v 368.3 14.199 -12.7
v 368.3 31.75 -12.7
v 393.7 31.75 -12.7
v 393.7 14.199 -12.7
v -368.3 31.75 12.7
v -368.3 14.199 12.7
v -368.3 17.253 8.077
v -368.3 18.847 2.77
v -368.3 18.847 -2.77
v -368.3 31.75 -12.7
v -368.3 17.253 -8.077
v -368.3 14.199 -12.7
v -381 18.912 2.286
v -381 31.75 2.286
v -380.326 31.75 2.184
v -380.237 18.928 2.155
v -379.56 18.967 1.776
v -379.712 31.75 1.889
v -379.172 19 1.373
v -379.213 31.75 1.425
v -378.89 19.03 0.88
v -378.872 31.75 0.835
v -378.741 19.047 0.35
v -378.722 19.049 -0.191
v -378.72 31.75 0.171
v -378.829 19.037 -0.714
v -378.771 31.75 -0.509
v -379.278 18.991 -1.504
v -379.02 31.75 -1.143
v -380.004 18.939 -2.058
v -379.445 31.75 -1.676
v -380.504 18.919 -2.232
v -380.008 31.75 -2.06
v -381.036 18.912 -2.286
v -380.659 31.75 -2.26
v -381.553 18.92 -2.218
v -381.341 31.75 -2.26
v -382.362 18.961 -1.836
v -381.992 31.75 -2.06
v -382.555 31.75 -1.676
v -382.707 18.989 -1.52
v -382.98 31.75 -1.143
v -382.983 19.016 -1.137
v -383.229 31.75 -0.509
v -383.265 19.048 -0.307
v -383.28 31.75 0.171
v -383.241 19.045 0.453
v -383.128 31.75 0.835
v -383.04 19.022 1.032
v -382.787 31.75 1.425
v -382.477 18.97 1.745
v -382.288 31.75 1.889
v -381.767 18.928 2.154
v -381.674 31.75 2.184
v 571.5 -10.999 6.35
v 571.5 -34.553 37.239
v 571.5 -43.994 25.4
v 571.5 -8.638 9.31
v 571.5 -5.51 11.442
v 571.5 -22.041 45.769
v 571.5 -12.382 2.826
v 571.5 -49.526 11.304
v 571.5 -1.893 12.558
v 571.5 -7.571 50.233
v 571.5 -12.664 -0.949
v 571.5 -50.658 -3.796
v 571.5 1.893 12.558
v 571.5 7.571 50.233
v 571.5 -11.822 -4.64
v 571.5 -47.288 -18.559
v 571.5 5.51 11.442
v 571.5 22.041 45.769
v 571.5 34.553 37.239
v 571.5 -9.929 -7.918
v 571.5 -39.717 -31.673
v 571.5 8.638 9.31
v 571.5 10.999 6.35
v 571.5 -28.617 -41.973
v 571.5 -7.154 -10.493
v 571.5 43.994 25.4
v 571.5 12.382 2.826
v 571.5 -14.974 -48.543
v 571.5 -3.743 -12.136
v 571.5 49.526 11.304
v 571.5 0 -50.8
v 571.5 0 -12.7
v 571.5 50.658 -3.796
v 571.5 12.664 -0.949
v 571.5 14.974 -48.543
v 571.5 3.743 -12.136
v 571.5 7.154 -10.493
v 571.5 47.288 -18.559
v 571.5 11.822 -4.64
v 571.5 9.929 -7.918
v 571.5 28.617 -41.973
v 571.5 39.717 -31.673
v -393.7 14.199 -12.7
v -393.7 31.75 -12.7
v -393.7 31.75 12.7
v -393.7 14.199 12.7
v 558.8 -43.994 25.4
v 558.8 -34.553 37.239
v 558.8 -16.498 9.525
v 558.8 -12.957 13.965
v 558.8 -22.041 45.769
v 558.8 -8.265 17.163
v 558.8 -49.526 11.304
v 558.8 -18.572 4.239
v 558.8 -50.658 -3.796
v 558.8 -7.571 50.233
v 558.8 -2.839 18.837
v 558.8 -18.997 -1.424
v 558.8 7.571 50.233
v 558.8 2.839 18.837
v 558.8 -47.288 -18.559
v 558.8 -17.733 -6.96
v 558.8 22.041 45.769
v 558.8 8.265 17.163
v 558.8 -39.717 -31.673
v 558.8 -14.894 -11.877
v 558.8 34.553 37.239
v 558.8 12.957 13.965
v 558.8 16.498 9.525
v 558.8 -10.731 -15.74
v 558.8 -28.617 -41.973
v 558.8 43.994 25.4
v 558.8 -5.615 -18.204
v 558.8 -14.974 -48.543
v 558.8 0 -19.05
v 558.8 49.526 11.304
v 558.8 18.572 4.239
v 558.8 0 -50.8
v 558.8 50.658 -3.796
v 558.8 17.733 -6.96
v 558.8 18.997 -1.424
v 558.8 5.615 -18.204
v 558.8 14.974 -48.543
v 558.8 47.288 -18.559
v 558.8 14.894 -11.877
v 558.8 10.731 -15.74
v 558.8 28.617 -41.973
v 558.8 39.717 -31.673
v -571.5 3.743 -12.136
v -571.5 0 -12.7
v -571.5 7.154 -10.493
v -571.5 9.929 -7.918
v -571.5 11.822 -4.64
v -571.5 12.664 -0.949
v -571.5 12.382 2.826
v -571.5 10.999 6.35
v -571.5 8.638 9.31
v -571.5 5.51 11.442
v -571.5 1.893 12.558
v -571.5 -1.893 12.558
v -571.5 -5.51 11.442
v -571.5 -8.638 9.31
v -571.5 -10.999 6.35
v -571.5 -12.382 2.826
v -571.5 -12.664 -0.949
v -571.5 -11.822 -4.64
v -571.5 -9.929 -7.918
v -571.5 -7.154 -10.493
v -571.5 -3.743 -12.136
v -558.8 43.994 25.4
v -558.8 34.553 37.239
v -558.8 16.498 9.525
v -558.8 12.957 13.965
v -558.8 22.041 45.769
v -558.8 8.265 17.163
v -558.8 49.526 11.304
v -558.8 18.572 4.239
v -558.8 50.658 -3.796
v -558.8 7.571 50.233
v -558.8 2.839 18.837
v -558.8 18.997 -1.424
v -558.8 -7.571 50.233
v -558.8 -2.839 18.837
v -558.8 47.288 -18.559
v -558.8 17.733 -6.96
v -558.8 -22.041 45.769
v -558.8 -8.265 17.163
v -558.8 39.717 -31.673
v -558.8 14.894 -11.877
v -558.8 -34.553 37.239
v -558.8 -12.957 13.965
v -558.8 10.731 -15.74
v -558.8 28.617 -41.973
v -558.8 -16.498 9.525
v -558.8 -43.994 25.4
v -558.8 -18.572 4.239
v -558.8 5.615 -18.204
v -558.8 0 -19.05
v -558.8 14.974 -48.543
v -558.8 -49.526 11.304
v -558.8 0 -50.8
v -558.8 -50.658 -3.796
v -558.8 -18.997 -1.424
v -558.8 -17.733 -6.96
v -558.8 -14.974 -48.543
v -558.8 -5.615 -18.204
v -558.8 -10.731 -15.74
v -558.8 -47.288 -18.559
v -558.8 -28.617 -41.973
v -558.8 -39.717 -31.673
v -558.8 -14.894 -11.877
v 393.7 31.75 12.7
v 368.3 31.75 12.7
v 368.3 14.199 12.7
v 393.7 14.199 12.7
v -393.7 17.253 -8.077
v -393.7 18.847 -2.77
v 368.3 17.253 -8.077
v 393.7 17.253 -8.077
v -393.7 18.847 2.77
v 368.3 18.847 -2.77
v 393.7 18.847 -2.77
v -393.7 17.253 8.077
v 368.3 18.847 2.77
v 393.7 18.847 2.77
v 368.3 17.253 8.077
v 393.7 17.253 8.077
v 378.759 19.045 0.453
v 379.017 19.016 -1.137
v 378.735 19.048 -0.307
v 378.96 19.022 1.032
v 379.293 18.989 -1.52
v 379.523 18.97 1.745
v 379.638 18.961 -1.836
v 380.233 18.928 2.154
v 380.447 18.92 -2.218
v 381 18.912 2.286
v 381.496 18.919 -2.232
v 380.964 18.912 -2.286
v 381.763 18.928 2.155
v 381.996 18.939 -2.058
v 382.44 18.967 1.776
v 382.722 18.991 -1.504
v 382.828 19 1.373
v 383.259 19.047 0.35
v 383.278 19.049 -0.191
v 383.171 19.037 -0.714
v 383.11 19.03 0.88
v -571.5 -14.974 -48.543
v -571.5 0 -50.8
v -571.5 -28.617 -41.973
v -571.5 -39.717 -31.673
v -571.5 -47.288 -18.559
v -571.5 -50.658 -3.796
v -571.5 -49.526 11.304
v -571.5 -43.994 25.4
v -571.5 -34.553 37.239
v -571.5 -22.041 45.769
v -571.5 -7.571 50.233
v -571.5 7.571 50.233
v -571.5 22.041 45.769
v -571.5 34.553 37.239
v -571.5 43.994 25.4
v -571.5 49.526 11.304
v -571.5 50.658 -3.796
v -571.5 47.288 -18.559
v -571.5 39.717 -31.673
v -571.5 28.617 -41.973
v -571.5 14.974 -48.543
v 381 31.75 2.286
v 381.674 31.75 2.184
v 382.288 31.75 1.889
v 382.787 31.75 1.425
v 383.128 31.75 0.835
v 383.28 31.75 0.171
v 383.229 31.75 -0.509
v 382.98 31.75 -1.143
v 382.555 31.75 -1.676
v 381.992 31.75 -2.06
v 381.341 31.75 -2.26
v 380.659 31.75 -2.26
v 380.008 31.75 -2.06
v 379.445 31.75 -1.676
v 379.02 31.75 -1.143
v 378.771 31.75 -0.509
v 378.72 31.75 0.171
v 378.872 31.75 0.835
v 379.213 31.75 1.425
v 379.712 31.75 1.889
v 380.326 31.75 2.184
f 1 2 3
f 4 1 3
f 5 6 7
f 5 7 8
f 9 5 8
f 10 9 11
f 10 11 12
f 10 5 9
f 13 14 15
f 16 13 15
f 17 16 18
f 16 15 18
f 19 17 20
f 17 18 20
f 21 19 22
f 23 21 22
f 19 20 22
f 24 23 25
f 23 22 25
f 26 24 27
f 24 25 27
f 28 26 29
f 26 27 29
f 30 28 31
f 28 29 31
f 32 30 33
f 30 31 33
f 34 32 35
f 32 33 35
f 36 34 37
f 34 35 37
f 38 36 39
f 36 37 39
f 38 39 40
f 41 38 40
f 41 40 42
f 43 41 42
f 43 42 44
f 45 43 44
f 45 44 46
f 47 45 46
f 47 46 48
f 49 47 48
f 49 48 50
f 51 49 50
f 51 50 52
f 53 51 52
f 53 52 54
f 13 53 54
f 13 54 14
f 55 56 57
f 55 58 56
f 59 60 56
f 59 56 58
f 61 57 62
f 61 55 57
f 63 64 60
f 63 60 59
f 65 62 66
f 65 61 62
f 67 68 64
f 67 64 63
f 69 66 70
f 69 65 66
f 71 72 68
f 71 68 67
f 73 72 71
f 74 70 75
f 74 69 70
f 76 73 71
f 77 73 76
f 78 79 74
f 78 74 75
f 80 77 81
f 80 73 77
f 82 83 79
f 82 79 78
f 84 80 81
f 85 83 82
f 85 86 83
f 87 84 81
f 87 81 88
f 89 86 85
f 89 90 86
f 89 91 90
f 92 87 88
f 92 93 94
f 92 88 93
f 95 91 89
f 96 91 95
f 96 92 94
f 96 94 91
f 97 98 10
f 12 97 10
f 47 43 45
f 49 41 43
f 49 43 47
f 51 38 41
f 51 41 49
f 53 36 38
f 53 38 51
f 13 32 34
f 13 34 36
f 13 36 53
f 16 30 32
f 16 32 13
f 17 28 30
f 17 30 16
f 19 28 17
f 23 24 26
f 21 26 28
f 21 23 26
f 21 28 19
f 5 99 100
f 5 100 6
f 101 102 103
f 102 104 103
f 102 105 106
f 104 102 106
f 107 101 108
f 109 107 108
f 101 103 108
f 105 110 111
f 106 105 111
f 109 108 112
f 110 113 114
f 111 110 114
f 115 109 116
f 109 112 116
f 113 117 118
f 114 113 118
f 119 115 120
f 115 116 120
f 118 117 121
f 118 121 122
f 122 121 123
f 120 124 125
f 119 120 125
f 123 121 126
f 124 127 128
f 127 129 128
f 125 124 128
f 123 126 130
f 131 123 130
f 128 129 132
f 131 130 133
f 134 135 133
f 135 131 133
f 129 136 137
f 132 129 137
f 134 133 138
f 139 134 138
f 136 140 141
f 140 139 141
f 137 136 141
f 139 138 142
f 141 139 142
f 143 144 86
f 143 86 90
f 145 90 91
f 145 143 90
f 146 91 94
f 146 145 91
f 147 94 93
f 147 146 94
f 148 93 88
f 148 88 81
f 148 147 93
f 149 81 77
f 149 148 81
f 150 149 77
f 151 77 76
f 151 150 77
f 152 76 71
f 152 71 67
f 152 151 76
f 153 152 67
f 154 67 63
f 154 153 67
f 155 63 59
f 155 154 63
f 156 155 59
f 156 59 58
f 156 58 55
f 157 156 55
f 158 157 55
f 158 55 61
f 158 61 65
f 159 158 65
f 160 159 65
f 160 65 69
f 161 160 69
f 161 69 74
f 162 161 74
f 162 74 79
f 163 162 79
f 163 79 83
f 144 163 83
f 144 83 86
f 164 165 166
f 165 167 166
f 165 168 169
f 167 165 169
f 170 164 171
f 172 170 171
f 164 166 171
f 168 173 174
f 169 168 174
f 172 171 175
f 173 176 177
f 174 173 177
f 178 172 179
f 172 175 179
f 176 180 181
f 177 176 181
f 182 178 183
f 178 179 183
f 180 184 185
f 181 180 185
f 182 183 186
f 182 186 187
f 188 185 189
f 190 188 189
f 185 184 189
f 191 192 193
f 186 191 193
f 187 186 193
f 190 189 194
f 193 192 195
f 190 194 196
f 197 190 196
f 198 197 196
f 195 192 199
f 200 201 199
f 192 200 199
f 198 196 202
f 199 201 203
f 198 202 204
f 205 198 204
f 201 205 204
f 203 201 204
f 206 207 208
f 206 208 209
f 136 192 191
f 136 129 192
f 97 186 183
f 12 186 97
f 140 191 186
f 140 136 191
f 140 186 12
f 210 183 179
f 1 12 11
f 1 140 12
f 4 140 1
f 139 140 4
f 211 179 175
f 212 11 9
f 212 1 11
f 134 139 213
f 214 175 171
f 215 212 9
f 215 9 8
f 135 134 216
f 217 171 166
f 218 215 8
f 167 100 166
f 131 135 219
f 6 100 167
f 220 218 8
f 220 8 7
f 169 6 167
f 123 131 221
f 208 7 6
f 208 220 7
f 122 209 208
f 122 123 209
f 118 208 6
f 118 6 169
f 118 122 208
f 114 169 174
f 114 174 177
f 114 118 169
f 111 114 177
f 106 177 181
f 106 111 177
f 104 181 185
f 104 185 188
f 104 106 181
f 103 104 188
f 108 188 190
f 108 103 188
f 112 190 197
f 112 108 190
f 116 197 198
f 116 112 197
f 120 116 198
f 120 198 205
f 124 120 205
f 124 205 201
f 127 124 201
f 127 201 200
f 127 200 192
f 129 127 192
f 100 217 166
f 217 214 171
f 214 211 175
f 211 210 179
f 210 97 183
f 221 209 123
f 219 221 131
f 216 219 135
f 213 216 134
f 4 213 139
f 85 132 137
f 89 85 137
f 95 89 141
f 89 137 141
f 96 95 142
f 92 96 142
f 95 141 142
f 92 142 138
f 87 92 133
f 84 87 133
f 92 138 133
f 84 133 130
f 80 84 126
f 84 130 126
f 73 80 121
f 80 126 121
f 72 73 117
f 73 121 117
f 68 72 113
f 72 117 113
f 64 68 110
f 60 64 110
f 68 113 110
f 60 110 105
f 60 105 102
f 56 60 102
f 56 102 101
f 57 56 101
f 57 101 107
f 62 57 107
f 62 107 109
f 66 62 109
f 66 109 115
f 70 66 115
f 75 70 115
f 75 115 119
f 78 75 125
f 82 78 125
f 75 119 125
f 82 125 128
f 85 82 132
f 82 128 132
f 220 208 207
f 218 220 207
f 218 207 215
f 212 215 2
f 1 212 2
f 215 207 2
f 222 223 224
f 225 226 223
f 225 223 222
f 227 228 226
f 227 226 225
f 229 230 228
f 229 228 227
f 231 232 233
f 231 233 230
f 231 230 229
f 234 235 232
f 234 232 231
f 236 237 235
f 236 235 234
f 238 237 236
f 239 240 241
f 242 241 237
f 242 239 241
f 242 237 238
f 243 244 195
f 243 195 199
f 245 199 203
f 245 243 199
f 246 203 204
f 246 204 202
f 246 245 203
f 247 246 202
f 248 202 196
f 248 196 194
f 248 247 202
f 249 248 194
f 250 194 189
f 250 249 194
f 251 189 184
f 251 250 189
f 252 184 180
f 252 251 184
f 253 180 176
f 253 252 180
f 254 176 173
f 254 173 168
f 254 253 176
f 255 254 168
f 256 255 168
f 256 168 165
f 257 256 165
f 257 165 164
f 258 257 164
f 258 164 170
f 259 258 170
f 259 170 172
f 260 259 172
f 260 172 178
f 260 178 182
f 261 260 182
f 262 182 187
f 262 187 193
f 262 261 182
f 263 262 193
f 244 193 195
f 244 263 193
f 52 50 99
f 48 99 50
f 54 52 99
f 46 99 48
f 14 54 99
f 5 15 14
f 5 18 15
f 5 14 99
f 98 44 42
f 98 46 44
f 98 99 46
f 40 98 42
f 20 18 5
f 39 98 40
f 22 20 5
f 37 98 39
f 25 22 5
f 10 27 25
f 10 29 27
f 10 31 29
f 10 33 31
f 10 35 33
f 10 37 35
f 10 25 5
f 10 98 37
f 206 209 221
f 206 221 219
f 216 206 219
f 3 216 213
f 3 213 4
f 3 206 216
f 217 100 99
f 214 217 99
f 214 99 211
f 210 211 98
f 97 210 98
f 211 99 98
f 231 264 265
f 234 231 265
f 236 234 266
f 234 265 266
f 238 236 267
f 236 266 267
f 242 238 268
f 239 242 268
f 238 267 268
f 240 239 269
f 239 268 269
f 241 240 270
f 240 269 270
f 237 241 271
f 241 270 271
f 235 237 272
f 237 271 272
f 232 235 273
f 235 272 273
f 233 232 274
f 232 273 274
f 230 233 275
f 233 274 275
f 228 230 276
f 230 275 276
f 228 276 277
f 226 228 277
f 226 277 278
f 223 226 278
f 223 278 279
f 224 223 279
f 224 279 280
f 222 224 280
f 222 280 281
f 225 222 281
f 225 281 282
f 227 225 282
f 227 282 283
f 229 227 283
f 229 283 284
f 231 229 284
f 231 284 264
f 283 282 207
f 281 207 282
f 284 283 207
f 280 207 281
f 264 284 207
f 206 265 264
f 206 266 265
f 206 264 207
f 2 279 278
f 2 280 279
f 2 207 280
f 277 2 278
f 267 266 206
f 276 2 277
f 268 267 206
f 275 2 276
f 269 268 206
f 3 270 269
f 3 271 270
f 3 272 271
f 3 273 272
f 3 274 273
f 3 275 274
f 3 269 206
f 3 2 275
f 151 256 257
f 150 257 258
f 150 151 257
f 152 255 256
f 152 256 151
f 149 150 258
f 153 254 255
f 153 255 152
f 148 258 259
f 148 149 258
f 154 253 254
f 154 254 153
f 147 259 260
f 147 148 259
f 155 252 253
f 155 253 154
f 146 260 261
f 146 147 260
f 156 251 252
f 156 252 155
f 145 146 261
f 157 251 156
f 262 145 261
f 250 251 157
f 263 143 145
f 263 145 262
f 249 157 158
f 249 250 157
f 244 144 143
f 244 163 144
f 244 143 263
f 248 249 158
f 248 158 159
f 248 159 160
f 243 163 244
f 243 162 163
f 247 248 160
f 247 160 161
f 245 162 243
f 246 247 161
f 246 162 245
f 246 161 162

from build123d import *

# Parameters (mm, degrees)
SKETCH1_R                = 19.05
SKETCH1_R_2              = 12.7
BOSS_EXTRUDE1_DEPTH      = 571.5
BOSS_EXTRUDE2_START      = -12.7
SKETCH2_R                = 50.8
SKETCH2_R_2              = 12.7
BOSS_EXTRUDE2_DEPTH      = 12.7
SKETCH3_R                = 50.8
SKETCH3_R_2              = 12.7
BOSS_EXTRUDE3_DEPTH      = 12.7
BOSS_EXTRUDE4_REACH      = 609.748
BOSS_EXTRUDE4_END_RADIUS = 19.05
BOSS_EXTRUDE4_START      = 31.75
SKETCH4_W                = 25.4
SKETCH4_H                = 25.4
SKETCH4_R                = 2.286


with BuildPart() as part:
    # Sketch1 → Boss-Extrude1 (new, symmetric)
    with BuildSketch(Plane(origin=(0, 0, 0), x_dir=(0, 0, -1), z_dir=(1, 0, 0))):
        Circle(SKETCH1_R)
        Circle(SKETCH1_R_2, mode=Mode.SUBTRACT)
    extrude(amount=BOSS_EXTRUDE1_DEPTH, both=True)

    # Sketch2 → Boss-Extrude2 (add)
    with BuildSketch(Plane(origin=(571.5, 0, 0), x_dir=(0, 0, -1), z_dir=(1, 0, 0)).offset(BOSS_EXTRUDE2_START)):
        Circle(SKETCH2_R)
        Circle(SKETCH2_R_2, mode=Mode.SUBTRACT)
    extrude(amount=BOSS_EXTRUDE2_DEPTH)

    # Sketch3 → Boss-Extrude3 (add)
    with BuildSketch(Plane.ZY.offset(571.5)):
        with Locations(Location((0, 0, 0), (0, 0, 180))):
            Circle(SKETCH3_R)
        with Locations(Location((0, 0, 0), (0, 0, 180))):
            Circle(SKETCH3_R_2, mode=Mode.SUBTRACT)
    extrude(amount=-BOSS_EXTRUDE3_DEPTH)

    # Boss-Extrude4: up to this cylinder (the profile starts outside it)
    boss_extrude4_end = Plane(origin=(-6.170395, 0, 0), z_dir=(-1, 0, 0)) * Cylinder(BOSS_EXTRUDE4_END_RADIUS, 2008.25521, mode=Mode.PRIVATE)
    # Sketch4 → Boss-Extrude4 (add, up to the surface)
    with BuildSketch(Plane(origin=(0, 0, 0), x_dir=(1, 0, 0), z_dir=(0, 1, 0)).offset(BOSS_EXTRUDE4_START), mode=Mode.PRIVATE) as boss_extrude4_sk1:
        with Locations((-381, 0)):
            Rectangle(SKETCH4_W, SKETCH4_H)
        with Locations(Location((-381, 0, 0), (0, 0, 270))):
            Circle(SKETCH4_R, mode=Mode.SUBTRACT)
    boss_extrude4_tool1 = extrude(boss_extrude4_sk1.sketch, amount=-BOSS_EXTRUDE4_REACH, mode=Mode.PRIVATE) - boss_extrude4_end
    add(boss_extrude4_tool1.solids().sort_by_distance((-381, 31.75, 12.34079))[0])
    # Sketch4 → Boss-Extrude4 (add, up to the surface)
    with BuildSketch(Plane(origin=(0, 0, 0), x_dir=(1, 0, 0), z_dir=(0, 1, 0)).offset(BOSS_EXTRUDE4_START), mode=Mode.PRIVATE) as boss_extrude4_sk2:
        with Locations((381, 0)):
            Rectangle(SKETCH4_W, SKETCH4_H)
        with Locations(Location((381, 0, 0), (0, 0, 270))):
            Circle(SKETCH4_R, mode=Mode.SUBTRACT)
    boss_extrude4_tool2 = extrude(boss_extrude4_sk2.sketch, amount=-BOSS_EXTRUDE4_REACH, mode=Mode.PRIVATE) - boss_extrude4_end
    add(boss_extrude4_tool2.solids().sort_by_distance((368.65921, 31.75, 0))[0])


solid = part.part
